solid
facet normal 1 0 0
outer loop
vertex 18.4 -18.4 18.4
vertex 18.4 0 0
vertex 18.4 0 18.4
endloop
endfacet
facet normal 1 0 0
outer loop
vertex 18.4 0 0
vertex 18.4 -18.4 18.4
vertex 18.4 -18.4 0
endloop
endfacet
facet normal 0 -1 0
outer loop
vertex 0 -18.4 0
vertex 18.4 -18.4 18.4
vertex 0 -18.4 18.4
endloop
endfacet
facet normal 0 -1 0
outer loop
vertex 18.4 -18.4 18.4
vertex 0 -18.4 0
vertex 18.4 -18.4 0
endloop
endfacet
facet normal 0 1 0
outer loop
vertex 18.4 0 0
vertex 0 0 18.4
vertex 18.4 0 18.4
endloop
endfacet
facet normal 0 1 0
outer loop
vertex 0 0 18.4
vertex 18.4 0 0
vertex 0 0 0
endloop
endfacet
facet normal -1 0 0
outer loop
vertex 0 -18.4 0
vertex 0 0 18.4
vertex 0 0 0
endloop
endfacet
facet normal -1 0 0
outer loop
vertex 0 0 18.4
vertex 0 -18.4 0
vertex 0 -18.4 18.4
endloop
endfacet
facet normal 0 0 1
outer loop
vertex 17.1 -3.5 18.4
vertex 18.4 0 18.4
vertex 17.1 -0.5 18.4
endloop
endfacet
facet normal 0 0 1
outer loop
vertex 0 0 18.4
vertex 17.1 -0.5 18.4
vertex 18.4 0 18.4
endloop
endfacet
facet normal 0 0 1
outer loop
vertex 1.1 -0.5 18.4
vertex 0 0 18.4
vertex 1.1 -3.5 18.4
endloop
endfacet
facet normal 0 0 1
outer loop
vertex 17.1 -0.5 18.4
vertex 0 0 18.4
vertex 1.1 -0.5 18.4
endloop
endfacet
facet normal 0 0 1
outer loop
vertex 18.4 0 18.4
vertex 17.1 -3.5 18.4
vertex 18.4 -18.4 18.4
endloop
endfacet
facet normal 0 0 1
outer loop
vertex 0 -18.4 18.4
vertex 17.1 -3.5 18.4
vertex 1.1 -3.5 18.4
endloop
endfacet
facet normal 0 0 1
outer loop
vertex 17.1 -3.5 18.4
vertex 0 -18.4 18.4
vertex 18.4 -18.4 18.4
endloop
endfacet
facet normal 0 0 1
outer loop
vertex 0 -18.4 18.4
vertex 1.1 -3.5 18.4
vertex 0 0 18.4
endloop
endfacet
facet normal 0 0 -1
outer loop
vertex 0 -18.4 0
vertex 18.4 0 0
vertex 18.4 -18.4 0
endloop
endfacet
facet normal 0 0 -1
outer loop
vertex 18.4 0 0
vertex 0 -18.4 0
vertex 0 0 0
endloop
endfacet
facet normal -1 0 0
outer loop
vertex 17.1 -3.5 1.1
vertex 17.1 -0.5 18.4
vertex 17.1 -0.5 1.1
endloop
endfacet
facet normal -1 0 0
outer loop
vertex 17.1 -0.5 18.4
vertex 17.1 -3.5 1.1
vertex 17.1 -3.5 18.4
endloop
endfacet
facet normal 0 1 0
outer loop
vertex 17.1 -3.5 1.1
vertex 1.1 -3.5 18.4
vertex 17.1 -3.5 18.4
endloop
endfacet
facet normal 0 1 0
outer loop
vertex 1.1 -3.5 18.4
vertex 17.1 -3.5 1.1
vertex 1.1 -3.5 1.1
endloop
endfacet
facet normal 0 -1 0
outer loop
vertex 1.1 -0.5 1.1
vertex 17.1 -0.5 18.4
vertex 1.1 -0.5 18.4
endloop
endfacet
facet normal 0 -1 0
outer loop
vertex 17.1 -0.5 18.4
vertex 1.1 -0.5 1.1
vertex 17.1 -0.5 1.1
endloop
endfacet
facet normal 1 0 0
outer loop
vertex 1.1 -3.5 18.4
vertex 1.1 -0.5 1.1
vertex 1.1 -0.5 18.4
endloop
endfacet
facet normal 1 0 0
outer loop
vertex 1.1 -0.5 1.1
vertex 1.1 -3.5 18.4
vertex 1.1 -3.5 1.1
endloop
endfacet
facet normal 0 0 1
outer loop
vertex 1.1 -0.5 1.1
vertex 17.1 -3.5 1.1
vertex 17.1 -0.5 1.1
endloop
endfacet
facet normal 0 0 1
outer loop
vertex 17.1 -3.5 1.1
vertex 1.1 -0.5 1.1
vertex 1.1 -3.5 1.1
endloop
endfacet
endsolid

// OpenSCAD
outer = 18.4;
inner = 16;
tray = 3;

module box(){
rotate([90,0,0]){
	difference(){
		cube([outer,outer,outer]);
		translate([1.1,1.1,.5]) cube([inner,inner+4,tray]);
	}
}
}

box();
